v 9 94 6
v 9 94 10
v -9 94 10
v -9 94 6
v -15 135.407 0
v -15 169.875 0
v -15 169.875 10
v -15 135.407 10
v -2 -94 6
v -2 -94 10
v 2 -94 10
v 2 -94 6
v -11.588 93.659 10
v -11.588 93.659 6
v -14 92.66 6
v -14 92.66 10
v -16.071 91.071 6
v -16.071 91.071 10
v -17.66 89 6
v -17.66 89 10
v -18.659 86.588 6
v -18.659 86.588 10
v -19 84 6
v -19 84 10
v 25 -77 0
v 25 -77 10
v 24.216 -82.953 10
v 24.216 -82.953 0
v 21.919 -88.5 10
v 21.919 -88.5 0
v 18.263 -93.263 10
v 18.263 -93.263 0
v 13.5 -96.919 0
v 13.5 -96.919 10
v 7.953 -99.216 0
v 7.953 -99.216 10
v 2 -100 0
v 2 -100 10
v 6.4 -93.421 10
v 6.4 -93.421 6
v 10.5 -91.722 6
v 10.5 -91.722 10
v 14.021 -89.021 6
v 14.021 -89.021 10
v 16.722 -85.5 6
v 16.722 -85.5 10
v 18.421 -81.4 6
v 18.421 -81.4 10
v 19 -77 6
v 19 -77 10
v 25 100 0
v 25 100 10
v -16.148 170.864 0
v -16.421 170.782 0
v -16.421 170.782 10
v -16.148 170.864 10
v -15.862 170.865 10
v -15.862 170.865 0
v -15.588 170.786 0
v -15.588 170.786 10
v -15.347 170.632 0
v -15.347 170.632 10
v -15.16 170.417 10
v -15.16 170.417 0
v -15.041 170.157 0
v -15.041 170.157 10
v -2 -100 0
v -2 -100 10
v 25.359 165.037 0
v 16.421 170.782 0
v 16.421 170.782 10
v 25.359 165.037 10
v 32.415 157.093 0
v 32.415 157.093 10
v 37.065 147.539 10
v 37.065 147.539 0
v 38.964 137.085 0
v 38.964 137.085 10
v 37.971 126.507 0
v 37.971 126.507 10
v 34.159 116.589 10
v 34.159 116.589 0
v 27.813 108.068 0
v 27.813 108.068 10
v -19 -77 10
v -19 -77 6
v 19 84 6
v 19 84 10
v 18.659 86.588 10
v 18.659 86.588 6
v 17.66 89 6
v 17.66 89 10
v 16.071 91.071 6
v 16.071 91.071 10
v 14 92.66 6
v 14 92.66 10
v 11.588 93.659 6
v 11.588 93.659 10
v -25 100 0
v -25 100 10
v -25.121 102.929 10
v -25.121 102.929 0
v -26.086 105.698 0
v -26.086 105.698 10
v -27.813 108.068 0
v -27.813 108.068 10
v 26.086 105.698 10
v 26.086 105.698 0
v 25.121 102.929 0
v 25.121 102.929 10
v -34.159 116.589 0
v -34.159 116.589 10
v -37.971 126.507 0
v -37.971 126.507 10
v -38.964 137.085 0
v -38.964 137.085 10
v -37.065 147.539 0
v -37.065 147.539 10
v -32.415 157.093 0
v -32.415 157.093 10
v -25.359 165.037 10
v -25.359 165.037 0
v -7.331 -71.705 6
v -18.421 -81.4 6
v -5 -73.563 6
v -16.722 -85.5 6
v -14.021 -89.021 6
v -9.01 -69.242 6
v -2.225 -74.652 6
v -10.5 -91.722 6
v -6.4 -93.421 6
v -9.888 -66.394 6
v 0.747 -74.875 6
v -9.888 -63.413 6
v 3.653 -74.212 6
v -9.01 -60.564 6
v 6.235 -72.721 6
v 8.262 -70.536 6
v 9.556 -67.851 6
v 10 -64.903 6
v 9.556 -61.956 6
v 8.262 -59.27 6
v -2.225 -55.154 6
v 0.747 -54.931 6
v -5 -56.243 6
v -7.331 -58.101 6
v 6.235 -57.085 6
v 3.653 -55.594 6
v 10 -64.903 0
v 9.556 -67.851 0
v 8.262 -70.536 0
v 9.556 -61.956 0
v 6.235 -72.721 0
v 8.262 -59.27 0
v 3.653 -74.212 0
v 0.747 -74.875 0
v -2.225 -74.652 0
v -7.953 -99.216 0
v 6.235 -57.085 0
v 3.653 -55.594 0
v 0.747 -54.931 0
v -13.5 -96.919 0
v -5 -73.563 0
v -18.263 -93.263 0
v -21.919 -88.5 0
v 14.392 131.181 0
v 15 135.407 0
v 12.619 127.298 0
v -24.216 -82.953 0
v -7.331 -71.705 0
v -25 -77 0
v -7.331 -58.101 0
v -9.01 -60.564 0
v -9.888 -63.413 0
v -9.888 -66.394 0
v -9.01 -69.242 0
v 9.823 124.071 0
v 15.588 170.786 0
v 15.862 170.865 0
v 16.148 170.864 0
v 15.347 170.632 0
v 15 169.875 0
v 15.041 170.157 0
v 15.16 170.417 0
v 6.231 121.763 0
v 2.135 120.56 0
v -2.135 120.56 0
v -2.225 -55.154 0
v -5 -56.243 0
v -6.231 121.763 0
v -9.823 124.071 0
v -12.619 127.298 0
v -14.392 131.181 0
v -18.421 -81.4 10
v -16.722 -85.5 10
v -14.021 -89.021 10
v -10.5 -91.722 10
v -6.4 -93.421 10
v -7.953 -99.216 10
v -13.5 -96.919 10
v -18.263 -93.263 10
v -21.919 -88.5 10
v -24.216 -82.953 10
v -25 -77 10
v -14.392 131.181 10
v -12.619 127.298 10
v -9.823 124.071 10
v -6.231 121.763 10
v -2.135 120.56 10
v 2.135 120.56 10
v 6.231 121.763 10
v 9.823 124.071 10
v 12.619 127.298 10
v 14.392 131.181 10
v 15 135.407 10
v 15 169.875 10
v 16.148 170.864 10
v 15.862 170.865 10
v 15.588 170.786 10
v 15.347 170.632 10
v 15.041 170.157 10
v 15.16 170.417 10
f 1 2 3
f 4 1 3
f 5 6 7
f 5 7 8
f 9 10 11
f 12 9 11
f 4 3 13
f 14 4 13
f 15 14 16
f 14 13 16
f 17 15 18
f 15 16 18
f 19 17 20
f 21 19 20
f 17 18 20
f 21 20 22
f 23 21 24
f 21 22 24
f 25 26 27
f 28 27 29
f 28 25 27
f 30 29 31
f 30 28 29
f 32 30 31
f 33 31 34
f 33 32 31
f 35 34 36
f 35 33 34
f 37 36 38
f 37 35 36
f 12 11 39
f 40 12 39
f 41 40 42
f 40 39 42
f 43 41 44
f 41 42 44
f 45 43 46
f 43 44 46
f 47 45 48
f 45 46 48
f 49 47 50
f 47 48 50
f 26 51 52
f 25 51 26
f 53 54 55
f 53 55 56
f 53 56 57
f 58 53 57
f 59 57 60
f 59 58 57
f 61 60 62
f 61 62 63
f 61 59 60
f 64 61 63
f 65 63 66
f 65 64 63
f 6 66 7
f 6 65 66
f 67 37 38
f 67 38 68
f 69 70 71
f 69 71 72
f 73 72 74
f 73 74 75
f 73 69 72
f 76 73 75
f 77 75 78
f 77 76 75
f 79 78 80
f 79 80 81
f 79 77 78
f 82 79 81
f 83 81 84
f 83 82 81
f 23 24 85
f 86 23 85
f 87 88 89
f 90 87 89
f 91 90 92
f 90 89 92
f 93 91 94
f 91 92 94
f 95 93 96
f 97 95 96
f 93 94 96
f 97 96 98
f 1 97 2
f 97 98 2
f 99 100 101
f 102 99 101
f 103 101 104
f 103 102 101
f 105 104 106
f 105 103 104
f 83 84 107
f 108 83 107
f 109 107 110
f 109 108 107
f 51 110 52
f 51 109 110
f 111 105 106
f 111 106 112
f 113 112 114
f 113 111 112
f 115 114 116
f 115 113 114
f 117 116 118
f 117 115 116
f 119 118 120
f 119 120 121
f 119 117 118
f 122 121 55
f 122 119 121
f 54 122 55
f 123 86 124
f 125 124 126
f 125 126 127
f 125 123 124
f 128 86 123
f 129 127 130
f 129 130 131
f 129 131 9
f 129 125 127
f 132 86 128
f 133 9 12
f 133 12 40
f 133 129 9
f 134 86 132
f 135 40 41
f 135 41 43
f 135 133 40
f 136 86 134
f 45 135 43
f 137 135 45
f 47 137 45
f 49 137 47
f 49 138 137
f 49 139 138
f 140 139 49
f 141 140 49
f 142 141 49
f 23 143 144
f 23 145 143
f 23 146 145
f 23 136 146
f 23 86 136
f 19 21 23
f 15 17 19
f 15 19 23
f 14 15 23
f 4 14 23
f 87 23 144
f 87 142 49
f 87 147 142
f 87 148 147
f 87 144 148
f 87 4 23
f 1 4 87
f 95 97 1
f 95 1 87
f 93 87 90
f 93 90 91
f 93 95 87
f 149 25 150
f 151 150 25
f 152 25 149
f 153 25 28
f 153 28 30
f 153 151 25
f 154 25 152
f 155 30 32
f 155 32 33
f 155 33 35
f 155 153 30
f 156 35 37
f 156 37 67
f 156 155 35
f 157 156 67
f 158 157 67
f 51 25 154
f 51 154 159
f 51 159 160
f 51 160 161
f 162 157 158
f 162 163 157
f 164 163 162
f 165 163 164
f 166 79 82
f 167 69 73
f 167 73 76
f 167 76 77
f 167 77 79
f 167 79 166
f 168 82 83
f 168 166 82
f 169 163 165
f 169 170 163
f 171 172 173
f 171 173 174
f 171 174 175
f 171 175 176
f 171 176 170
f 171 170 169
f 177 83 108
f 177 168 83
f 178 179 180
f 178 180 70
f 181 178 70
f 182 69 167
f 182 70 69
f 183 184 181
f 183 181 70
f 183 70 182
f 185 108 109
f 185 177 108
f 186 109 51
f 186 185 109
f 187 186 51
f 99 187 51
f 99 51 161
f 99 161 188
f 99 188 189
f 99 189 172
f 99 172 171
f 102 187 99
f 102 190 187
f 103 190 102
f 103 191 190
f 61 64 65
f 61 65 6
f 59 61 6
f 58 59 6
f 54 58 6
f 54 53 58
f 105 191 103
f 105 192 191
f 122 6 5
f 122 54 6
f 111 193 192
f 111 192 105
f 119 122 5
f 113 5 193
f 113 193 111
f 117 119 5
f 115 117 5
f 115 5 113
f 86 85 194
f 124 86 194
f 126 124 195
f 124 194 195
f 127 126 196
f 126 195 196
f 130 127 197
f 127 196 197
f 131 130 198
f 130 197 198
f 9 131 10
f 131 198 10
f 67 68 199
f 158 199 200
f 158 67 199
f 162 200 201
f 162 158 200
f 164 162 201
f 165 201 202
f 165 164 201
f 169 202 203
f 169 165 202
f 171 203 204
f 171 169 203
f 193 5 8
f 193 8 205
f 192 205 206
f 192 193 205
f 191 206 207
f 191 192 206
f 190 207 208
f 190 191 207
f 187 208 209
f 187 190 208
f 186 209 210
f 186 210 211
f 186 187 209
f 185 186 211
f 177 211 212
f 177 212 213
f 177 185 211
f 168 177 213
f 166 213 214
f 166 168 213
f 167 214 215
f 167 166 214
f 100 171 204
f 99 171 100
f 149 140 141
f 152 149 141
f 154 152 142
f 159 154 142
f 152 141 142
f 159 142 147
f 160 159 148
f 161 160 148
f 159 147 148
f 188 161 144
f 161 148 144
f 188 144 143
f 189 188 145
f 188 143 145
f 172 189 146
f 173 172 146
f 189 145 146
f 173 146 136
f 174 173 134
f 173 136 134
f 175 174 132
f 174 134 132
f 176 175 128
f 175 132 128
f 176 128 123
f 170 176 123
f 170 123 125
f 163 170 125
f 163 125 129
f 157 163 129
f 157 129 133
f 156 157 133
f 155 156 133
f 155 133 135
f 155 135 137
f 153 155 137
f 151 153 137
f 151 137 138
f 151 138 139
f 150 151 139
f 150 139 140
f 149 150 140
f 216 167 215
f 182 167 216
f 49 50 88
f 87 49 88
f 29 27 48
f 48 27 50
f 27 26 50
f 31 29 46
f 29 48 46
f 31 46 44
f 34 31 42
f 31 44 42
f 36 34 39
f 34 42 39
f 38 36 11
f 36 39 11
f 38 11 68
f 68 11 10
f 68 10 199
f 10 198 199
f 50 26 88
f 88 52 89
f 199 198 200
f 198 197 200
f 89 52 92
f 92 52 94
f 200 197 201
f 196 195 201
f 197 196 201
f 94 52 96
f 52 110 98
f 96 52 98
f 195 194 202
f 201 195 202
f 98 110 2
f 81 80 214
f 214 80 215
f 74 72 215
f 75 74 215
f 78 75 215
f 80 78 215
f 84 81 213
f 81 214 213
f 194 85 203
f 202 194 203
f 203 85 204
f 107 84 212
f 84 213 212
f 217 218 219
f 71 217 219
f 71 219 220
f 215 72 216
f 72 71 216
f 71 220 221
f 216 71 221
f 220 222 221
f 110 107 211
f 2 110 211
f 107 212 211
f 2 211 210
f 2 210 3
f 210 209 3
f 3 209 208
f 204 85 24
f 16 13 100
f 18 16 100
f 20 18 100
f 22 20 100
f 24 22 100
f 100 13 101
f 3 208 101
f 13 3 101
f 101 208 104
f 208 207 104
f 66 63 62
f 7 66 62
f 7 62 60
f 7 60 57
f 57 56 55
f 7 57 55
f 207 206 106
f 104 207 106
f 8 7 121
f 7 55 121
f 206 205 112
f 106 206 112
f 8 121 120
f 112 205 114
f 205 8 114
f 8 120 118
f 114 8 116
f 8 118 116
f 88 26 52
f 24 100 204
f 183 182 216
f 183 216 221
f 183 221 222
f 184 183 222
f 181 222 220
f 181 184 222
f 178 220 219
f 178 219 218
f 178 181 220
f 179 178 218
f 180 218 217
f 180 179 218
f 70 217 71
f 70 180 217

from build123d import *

# Parameters (mm, degrees)
SALIENTE_EXTRUIR1_DEPTH = 10
REDONDEO1_R             = 10
CORTAR_EXTRUIR1_DEPTH   = 4
CROQUIS4_R              = 10
CORTAR_EXTRUIR2_DEPTH   = 10


with BuildPart() as part:
    # Croquis1 → Saliente-Extruir1 (new body)
    with BuildSketch(Plane.XY):
        with BuildLine():
            Line((16.349667964, 100), (25, 100))
            Line((25, 100), (25, -77))
            ThreePointArc((25, -77), (18.263455967, -93.263455967), (2, -100))
            Line((2, -100), (-2, -100))
            ThreePointArc((-2, -100), (-18.263455967, -93.263455967), (-25, -77))
            Line((-25, -77), (-25, 100))
            Line((-25, 100), (-16.349667964, 100))
            ThreePointArc((-16.349667964, 100), (-38.999980166, 135.368129777), (-16.421052632, 170.781873976))
            ThreePointArc((-16.421052632, 170.781873976), (-15.461972413, 170.717764999), (-15, 169.874837769))
            Line((-15, 169.874837769), (-15, 135.40746189))
            ThreePointArc((-15, 135.40746189), (0, 120.40746189), (15, 135.40746189))
            Line((15, 135.40746189), (15, 169.874837769))
            ThreePointArc((15, 169.874837769), (15.461972413, 170.717764999), (16.421052632, 170.781873976))
            ThreePointArc((16.421052632, 170.781873976), (38.999980166, 135.368129777), (16.349667964, 100))
        make_face()
    extrude(amount=SALIENTE_EXTRUIR1_DEPTH)

    # Redondeo1
    # the kernel refuses this fillet: 10 mm, written as the material it adds along each edge
    with BuildSketch(Plane(origin=(-16.349667964, 100, 0), x_dir=(-1, 0, 0), z_dir=(0, 0, 1))) as redondeo1_piece_1:
        with BuildLine():
            CenterArc((18.594262382, -1.057473068), REDONDEO1_R, 173.929776198, 50.579134401)
            Line((11.462848025, -8.067674869), (11.320219738, -8.207878905))
            ThreePointArc((11.320219738, -8.207878905), (5.981746269, -3.678170401), (-0.083844451, -0.181576728))
            Line((-0.083844451, -0.181576728), (0, 0.2))
            ThreePointArc((0, 0.2), (4.325166018, 0.2), (8.451453429, 0.021149461))
            Line((8.451453429, 0.021149461), (8.650332036, 0))
        make_face()
    extrude(amount=10)
    with BuildSketch(Plane(origin=(16.349667964, 100, 0), x_dir=(0.8177652445483508, 0.5755519132178922, 0), z_dir=(0, 0, 1))) as redondeo1_piece_2:
        with BuildLine():
            CenterArc((15.814372171, -9.837198566), REDONDEO1_R, 100.352797219, 50.579134401)
            Line((7.073940893, -4.978715153), (6.899132268, -4.881545485))
            ThreePointArc((6.899132268, -4.881545485), (3.421860064, -2.652910626), (-0.115110383, -0.163553049))
            Line((-0.115110383, -0.163553049), (0.035941755, 0.196743971))
            ThreePointArc((0.035941755, 0.196743971), (7.008642212, -0.434925592), (13.98134267, 0.196743971))
            Line((13.98134267, 0.196743971), (14.017284425, 0))
        make_face()
    extrude(amount=10)

    # Croquis3 → Cortar-Extruir1 (cut)
    with BuildSketch(Plane.XY.offset(10)):
        with BuildLine():
            Line((-2, -94), (2, -94))
            ThreePointArc((2, -94), (14.02081528, -89.02081528), (19, -77))
            Line((19, -77), (19, 84))
            ThreePointArc((19, 84), (16.071067812, 91.071067812), (9, 94))
            Line((9, 94), (-9, 94))
            ThreePointArc((-9, 94), (-16.071067812, 91.071067812), (-19, 84))
            Line((-19, 84), (-19, -77))
            ThreePointArc((-19, -77), (-14.02081528, -89.02081528), (-2, -94))
        make_face()
    extrude(amount=-CORTAR_EXTRUIR1_DEPTH, mode=Mode.SUBTRACT)

    # Croquis4 → Cortar-Extruir2 (cut)
    with BuildSketch(Plane.XY.offset(6)):
        with Locations((0, -64.903172803)):
            Circle(CROQUIS4_R)
    extrude(amount=-CORTAR_EXTRUIR2_DEPTH, mode=Mode.SUBTRACT)


solid = part.part
